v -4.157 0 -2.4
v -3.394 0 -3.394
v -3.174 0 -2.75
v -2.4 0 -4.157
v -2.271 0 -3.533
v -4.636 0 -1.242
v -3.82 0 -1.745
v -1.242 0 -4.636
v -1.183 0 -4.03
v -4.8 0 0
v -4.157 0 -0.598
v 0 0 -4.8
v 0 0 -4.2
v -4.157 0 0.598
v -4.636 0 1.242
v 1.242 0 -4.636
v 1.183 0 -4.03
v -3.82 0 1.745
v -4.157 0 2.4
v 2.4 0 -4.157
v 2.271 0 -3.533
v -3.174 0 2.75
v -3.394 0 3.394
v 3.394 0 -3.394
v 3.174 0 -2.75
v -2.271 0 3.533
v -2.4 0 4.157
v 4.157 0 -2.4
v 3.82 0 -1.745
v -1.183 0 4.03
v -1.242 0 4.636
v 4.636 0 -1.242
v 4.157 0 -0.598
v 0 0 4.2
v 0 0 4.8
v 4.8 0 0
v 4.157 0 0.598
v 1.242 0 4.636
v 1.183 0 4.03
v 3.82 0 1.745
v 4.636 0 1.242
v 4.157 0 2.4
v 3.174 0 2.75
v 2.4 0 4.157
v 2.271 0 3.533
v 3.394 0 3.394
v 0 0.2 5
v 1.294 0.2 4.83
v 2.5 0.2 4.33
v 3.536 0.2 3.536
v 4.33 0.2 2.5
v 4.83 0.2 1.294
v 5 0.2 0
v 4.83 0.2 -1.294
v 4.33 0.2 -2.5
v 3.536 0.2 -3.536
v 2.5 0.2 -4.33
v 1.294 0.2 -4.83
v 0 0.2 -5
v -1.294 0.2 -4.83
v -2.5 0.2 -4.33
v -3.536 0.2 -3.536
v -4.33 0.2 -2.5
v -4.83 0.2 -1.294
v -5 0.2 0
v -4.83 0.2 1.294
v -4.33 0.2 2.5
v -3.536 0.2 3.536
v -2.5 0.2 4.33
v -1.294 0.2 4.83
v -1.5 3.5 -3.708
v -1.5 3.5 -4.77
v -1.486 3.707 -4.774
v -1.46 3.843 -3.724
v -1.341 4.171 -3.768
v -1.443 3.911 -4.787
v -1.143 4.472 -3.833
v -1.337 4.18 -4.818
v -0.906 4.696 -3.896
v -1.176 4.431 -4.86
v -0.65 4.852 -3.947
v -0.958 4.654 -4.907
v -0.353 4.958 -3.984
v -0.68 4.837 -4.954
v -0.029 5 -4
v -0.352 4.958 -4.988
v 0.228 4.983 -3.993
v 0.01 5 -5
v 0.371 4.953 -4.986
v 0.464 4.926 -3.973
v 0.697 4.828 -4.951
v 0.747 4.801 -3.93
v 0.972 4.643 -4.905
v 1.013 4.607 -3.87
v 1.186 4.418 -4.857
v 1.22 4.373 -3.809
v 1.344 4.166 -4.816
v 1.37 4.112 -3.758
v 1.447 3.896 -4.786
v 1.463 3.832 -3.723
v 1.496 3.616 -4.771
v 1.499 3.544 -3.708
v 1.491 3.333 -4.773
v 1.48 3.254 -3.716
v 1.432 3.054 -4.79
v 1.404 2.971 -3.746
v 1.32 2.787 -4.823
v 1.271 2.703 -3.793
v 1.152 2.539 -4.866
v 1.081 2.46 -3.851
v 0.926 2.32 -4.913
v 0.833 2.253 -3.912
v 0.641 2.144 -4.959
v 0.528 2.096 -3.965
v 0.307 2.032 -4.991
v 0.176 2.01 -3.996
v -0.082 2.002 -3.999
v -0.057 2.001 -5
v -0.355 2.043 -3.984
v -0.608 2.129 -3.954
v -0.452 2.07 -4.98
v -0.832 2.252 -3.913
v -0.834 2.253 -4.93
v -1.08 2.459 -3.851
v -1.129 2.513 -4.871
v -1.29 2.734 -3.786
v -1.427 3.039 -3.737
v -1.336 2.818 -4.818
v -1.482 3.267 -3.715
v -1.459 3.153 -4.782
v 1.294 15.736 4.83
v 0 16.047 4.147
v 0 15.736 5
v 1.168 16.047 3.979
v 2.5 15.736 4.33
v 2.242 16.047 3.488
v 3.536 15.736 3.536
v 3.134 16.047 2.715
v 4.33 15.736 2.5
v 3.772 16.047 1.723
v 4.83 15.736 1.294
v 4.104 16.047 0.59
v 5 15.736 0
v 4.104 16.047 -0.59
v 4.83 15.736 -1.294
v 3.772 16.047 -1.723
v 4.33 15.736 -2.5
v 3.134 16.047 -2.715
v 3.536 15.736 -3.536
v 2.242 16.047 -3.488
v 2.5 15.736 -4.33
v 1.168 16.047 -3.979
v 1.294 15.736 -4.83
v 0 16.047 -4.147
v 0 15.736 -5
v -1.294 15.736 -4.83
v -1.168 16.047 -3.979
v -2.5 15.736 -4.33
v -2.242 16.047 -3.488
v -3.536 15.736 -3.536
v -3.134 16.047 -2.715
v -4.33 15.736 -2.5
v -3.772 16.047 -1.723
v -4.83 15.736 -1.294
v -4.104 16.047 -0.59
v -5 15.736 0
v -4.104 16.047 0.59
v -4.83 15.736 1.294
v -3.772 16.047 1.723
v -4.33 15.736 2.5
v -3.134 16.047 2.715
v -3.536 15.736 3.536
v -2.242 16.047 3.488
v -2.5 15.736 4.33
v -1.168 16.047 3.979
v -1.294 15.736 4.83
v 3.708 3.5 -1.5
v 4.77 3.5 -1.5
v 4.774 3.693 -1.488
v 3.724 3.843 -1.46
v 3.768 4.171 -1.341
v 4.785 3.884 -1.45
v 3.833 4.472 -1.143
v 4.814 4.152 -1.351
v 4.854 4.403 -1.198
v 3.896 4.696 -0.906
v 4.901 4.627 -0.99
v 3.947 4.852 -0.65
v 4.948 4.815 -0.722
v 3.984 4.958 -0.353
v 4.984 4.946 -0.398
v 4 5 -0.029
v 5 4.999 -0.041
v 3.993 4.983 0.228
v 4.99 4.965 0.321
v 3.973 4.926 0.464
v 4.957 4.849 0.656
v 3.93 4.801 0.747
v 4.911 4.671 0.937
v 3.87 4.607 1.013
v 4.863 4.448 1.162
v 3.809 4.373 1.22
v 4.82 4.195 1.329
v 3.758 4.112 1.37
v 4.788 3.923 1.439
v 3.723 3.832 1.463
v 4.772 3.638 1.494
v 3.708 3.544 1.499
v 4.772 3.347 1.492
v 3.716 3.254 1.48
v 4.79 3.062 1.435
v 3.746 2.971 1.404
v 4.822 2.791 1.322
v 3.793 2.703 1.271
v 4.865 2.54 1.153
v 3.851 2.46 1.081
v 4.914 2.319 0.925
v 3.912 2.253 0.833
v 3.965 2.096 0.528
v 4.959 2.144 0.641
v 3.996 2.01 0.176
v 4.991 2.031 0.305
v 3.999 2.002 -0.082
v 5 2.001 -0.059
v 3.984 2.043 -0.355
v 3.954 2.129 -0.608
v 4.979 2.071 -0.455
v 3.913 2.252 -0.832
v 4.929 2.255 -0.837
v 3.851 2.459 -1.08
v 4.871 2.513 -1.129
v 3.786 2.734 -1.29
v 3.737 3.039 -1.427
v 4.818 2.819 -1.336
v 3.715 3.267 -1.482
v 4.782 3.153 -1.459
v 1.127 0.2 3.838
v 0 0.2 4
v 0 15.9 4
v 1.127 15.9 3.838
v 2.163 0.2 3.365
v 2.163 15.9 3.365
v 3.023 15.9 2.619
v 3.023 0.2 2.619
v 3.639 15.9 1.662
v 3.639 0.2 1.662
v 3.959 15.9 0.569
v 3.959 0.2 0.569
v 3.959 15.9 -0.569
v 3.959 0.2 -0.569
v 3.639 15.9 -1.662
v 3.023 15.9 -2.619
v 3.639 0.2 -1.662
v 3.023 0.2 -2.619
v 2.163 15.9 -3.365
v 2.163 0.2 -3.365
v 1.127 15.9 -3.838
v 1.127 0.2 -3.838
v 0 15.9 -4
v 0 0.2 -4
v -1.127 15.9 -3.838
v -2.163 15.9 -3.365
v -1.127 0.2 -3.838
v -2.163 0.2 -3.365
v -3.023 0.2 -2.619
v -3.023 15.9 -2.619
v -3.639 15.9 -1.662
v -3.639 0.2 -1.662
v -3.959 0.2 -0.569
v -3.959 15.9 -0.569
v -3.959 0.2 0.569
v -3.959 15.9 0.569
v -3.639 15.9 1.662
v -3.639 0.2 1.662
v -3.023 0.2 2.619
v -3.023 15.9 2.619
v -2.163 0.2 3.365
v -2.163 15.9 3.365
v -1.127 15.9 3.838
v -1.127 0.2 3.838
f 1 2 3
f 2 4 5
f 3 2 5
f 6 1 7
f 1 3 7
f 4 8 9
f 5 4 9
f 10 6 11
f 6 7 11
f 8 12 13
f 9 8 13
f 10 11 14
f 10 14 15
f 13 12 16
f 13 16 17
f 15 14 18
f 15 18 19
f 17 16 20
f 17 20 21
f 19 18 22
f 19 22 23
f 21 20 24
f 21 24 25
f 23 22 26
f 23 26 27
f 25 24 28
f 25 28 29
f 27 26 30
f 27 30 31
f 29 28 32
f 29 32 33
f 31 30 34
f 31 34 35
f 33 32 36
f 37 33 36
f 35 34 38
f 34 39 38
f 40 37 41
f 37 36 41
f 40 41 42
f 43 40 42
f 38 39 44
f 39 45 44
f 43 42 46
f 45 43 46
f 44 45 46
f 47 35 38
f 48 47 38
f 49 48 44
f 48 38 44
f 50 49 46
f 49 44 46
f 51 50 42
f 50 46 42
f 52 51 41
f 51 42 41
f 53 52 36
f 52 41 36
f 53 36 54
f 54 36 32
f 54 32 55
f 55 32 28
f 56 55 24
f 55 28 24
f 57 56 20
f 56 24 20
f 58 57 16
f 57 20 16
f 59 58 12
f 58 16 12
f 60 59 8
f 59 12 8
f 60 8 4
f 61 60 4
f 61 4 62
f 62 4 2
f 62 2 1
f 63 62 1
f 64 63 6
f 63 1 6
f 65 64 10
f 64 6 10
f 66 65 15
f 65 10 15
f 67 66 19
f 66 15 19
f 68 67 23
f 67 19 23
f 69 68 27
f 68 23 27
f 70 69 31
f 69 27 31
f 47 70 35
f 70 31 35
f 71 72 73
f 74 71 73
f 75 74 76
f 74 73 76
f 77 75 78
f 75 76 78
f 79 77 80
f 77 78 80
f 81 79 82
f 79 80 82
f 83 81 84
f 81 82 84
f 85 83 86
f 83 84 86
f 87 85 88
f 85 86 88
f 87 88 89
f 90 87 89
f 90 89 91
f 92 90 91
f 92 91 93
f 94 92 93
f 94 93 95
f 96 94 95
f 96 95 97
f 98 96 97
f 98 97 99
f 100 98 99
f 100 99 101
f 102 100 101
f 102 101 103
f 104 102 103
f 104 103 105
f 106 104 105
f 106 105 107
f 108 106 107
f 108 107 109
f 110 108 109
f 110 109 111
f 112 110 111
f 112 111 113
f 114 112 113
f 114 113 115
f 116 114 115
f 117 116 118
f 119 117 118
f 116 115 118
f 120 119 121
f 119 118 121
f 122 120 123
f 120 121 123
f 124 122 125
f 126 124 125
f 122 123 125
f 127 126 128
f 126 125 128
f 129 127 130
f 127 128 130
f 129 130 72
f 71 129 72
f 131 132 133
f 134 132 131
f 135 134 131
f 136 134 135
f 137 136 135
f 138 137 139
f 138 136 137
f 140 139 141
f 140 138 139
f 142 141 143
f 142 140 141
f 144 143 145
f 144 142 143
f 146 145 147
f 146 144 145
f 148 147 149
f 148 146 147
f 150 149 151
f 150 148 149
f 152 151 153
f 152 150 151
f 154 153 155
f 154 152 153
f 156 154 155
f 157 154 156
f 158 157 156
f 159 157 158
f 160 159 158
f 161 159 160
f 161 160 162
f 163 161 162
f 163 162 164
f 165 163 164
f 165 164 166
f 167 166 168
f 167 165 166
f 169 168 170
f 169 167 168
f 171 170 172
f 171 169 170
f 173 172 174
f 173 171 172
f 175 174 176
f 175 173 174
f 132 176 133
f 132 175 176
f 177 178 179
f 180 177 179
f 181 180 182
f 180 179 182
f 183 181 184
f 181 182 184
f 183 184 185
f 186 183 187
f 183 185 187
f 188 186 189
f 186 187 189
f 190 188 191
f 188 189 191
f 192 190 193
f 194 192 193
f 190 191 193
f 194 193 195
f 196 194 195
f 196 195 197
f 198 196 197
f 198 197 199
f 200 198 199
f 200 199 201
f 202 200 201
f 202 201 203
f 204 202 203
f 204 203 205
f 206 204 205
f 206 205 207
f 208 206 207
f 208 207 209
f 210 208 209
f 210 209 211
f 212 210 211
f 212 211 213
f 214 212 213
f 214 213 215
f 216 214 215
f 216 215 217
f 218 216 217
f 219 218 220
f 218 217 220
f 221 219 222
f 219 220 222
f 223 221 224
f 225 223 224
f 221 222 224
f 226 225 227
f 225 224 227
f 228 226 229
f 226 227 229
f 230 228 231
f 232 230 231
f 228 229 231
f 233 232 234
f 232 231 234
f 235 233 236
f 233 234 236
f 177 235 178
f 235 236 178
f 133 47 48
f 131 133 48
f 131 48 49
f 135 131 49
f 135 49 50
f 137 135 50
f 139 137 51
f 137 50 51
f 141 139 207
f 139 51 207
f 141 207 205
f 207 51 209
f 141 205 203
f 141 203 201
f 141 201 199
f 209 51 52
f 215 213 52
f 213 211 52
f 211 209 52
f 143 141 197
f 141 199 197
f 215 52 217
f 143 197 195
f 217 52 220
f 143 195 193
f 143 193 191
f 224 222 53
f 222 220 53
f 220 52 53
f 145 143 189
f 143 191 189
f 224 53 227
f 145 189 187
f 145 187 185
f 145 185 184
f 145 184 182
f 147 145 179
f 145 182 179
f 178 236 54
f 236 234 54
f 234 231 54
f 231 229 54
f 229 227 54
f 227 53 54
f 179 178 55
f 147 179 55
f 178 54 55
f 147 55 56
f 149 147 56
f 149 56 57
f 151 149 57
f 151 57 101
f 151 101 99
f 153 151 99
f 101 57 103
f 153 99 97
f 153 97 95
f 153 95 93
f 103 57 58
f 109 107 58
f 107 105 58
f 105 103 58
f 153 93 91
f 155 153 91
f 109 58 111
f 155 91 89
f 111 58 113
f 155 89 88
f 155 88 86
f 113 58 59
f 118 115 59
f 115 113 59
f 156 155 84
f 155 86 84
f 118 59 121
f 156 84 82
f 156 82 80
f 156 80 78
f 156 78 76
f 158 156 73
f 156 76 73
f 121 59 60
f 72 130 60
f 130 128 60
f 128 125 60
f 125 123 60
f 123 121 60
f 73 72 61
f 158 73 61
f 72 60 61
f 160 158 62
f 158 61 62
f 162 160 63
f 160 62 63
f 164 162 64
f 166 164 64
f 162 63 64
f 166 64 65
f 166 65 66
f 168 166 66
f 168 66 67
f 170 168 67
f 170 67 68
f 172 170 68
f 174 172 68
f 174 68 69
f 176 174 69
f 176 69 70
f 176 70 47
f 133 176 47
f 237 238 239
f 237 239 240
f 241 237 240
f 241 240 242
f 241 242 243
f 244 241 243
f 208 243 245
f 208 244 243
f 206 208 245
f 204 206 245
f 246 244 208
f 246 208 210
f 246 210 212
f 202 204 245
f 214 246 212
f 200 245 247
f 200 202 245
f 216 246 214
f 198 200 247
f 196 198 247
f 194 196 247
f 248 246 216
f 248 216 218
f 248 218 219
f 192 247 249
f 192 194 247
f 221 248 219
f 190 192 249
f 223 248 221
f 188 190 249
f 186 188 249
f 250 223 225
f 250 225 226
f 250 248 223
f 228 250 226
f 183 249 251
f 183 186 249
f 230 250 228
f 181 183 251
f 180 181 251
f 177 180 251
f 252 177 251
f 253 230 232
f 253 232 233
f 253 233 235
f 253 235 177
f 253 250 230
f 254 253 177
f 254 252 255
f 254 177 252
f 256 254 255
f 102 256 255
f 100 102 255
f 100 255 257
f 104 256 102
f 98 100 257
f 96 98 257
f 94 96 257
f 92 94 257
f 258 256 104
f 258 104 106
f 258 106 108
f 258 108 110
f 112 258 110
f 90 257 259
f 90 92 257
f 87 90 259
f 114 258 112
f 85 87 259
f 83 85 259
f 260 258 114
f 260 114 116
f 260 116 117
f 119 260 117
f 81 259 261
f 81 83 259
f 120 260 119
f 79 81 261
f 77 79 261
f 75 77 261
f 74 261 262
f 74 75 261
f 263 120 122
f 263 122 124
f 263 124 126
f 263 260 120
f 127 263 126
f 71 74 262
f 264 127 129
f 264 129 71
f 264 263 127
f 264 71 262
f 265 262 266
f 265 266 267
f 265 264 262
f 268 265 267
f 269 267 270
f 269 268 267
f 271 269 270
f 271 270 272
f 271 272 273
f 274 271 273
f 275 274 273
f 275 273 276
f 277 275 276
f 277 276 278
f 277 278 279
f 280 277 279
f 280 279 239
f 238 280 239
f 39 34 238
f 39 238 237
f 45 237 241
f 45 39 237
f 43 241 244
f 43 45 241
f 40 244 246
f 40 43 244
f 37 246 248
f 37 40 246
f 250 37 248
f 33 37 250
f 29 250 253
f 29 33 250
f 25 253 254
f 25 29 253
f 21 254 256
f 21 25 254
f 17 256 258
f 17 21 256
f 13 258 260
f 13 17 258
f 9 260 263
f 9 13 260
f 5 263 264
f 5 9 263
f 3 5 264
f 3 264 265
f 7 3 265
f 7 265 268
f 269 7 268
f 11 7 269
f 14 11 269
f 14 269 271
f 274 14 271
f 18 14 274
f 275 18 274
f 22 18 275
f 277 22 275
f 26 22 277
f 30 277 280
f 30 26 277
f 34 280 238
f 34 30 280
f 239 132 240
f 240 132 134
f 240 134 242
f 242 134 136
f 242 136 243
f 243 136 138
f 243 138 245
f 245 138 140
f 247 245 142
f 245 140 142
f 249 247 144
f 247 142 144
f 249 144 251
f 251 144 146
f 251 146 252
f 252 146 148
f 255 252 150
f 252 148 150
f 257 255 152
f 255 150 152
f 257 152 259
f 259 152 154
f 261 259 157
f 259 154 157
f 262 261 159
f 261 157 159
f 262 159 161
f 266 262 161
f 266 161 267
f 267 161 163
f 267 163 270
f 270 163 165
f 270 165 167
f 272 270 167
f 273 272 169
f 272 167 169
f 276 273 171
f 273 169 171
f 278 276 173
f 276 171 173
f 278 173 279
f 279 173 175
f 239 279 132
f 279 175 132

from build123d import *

# Parameters (mm, degrees)
SKETCH1_R               = 5
SKETCH1_R_2             = 4
BOSS_EXTRUDE1_DEPTH     = 16.1
CHAMFER1_SIZE           = 0.2
CHAMFER2_SIZE           = 0.363970234
CHAMFER2_SIZE_2         = 1
CUT_EXTRUDE1_REACH      = 21.557
CUT_EXTRUDE1_END_RADIUS = 4
SKETCH2_R               = 1.5
CIRPATTERN1_COUNT       = 2
CIRPATTERN1_ANGLE       = 90


with BuildPart() as part:
    # Sketch1 → Boss-Extrude1 (new body)
    with BuildSketch(Plane(origin=(0, 0, 0), x_dir=(1, 0, 0), z_dir=(0, 1, 0))):
        with Locations(Location((0, 0, 0), (0, 0, 270))):
            Circle(SKETCH1_R)
        with Locations(Location((0, 0, 0), (0, 0, 270))):
            Circle(SKETCH1_R_2, mode=Mode.SUBTRACT)
    extrude(amount=BOSS_EXTRUDE1_DEPTH)

    # Chamfer1
    chamfer1_edges = [part.edges().sort_by_distance(p)[0] for p in [
        (0, 0, -5),
        (0, 0, -4),
        (0, 16.1, -4),
    ]]
    chamfer(chamfer1_edges, length=CHAMFER1_SIZE)

    # Chamfer2
    # the kernel refuses this chamfer: 1, 0.363970234 mm, written as the material it takes off along each edge
    with BuildSketch(Plane(origin=(0, 16.1, 0), x_dir=(0, 0, 1), z_dir=(-1, 0, 0))) as chamfer2_piece_1:
        Polygon((5, -CHAMFER2_SIZE), (5 - CHAMFER2_SIZE_2, 0), (5, 0), align=None)
    revolve(axis=Axis((0, 16.1, 0), (0, 1, 0)), mode=Mode.SUBTRACT)

    # Cut-Extrude1: up to this cylinder (the profile starts outside it)
    cut_extrude1_end = Plane(origin=(0, 3.5, 0), z_dir=(0, -1, 0)) * Cylinder(CUT_EXTRUDE1_END_RADIUS, 52.114, mode=Mode.PRIVATE)
    # Sketch2 → Cut-Extrude1 (cut, up to the surface)
    with BuildSketch(Plane(origin=(0, 0, -5), x_dir=(-1, 0, 0), z_dir=(0, 0, -1)), mode=Mode.PRIVATE) as cut_extrude1_sk1:
        with Locations((0, 3.5)):
            Circle(SKETCH2_R)
    cut_extrude1_tool1 = extrude(cut_extrude1_sk1.sketch, amount=-CUT_EXTRUDE1_REACH, mode=Mode.PRIVATE) - cut_extrude1_end
    cut_extrude1 = cut_extrude1_tool1.solids().sort_by_distance((0, 3.5, -5))[0]
    add(cut_extrude1, mode=Mode.SUBTRACT)

    # CirPattern1: Cut-Extrude1 ×2 about axis
    cirpattern1_axis = Axis((0, 15.9, 0), (0, -1, 0))
    for i in range(1, CIRPATTERN1_COUNT):
        add(cut_extrude1.rotate(cirpattern1_axis, i * CIRPATTERN1_ANGLE / (CIRPATTERN1_COUNT - 1)), mode=Mode.SUBTRACT)


solid = part.part
